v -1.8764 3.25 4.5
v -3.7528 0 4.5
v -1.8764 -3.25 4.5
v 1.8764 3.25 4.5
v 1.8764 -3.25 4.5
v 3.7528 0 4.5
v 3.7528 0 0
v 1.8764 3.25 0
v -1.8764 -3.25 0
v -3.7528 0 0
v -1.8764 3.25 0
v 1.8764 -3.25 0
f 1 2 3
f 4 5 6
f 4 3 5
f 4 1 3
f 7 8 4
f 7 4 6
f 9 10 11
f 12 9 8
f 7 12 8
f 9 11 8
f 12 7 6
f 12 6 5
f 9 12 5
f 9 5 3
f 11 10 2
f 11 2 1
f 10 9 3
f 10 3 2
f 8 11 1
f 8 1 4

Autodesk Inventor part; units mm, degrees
sketch "Sketch1" plane through (0, 0, 0) normal (0, 0, 1) x (1, 0, 0)
  line L0 (1.8764, 3.25) -> (3.7528, 0)
  line L1 (3.7528, 0) -> (1.8764, -3.25)
  line L2 (1.8764, -3.25) -> (-1.8764, -3.25)
  line L3 (-1.8764, -3.25) -> (-3.7528, 0)
  line L4 (-3.7528, 0) -> (-1.8764, 3.25)
  line L5 (-1.8764, 3.25) -> (1.8764, 3.25)
  point P0 (0, 0)
  point P1 (0, 0)
  dimension "d0" = 6.5
extrude "Extrusion1" add sketch "Sketch1" along normal blind 4.5
properties part number "servo_metal_600TVL_shaft_nut"
